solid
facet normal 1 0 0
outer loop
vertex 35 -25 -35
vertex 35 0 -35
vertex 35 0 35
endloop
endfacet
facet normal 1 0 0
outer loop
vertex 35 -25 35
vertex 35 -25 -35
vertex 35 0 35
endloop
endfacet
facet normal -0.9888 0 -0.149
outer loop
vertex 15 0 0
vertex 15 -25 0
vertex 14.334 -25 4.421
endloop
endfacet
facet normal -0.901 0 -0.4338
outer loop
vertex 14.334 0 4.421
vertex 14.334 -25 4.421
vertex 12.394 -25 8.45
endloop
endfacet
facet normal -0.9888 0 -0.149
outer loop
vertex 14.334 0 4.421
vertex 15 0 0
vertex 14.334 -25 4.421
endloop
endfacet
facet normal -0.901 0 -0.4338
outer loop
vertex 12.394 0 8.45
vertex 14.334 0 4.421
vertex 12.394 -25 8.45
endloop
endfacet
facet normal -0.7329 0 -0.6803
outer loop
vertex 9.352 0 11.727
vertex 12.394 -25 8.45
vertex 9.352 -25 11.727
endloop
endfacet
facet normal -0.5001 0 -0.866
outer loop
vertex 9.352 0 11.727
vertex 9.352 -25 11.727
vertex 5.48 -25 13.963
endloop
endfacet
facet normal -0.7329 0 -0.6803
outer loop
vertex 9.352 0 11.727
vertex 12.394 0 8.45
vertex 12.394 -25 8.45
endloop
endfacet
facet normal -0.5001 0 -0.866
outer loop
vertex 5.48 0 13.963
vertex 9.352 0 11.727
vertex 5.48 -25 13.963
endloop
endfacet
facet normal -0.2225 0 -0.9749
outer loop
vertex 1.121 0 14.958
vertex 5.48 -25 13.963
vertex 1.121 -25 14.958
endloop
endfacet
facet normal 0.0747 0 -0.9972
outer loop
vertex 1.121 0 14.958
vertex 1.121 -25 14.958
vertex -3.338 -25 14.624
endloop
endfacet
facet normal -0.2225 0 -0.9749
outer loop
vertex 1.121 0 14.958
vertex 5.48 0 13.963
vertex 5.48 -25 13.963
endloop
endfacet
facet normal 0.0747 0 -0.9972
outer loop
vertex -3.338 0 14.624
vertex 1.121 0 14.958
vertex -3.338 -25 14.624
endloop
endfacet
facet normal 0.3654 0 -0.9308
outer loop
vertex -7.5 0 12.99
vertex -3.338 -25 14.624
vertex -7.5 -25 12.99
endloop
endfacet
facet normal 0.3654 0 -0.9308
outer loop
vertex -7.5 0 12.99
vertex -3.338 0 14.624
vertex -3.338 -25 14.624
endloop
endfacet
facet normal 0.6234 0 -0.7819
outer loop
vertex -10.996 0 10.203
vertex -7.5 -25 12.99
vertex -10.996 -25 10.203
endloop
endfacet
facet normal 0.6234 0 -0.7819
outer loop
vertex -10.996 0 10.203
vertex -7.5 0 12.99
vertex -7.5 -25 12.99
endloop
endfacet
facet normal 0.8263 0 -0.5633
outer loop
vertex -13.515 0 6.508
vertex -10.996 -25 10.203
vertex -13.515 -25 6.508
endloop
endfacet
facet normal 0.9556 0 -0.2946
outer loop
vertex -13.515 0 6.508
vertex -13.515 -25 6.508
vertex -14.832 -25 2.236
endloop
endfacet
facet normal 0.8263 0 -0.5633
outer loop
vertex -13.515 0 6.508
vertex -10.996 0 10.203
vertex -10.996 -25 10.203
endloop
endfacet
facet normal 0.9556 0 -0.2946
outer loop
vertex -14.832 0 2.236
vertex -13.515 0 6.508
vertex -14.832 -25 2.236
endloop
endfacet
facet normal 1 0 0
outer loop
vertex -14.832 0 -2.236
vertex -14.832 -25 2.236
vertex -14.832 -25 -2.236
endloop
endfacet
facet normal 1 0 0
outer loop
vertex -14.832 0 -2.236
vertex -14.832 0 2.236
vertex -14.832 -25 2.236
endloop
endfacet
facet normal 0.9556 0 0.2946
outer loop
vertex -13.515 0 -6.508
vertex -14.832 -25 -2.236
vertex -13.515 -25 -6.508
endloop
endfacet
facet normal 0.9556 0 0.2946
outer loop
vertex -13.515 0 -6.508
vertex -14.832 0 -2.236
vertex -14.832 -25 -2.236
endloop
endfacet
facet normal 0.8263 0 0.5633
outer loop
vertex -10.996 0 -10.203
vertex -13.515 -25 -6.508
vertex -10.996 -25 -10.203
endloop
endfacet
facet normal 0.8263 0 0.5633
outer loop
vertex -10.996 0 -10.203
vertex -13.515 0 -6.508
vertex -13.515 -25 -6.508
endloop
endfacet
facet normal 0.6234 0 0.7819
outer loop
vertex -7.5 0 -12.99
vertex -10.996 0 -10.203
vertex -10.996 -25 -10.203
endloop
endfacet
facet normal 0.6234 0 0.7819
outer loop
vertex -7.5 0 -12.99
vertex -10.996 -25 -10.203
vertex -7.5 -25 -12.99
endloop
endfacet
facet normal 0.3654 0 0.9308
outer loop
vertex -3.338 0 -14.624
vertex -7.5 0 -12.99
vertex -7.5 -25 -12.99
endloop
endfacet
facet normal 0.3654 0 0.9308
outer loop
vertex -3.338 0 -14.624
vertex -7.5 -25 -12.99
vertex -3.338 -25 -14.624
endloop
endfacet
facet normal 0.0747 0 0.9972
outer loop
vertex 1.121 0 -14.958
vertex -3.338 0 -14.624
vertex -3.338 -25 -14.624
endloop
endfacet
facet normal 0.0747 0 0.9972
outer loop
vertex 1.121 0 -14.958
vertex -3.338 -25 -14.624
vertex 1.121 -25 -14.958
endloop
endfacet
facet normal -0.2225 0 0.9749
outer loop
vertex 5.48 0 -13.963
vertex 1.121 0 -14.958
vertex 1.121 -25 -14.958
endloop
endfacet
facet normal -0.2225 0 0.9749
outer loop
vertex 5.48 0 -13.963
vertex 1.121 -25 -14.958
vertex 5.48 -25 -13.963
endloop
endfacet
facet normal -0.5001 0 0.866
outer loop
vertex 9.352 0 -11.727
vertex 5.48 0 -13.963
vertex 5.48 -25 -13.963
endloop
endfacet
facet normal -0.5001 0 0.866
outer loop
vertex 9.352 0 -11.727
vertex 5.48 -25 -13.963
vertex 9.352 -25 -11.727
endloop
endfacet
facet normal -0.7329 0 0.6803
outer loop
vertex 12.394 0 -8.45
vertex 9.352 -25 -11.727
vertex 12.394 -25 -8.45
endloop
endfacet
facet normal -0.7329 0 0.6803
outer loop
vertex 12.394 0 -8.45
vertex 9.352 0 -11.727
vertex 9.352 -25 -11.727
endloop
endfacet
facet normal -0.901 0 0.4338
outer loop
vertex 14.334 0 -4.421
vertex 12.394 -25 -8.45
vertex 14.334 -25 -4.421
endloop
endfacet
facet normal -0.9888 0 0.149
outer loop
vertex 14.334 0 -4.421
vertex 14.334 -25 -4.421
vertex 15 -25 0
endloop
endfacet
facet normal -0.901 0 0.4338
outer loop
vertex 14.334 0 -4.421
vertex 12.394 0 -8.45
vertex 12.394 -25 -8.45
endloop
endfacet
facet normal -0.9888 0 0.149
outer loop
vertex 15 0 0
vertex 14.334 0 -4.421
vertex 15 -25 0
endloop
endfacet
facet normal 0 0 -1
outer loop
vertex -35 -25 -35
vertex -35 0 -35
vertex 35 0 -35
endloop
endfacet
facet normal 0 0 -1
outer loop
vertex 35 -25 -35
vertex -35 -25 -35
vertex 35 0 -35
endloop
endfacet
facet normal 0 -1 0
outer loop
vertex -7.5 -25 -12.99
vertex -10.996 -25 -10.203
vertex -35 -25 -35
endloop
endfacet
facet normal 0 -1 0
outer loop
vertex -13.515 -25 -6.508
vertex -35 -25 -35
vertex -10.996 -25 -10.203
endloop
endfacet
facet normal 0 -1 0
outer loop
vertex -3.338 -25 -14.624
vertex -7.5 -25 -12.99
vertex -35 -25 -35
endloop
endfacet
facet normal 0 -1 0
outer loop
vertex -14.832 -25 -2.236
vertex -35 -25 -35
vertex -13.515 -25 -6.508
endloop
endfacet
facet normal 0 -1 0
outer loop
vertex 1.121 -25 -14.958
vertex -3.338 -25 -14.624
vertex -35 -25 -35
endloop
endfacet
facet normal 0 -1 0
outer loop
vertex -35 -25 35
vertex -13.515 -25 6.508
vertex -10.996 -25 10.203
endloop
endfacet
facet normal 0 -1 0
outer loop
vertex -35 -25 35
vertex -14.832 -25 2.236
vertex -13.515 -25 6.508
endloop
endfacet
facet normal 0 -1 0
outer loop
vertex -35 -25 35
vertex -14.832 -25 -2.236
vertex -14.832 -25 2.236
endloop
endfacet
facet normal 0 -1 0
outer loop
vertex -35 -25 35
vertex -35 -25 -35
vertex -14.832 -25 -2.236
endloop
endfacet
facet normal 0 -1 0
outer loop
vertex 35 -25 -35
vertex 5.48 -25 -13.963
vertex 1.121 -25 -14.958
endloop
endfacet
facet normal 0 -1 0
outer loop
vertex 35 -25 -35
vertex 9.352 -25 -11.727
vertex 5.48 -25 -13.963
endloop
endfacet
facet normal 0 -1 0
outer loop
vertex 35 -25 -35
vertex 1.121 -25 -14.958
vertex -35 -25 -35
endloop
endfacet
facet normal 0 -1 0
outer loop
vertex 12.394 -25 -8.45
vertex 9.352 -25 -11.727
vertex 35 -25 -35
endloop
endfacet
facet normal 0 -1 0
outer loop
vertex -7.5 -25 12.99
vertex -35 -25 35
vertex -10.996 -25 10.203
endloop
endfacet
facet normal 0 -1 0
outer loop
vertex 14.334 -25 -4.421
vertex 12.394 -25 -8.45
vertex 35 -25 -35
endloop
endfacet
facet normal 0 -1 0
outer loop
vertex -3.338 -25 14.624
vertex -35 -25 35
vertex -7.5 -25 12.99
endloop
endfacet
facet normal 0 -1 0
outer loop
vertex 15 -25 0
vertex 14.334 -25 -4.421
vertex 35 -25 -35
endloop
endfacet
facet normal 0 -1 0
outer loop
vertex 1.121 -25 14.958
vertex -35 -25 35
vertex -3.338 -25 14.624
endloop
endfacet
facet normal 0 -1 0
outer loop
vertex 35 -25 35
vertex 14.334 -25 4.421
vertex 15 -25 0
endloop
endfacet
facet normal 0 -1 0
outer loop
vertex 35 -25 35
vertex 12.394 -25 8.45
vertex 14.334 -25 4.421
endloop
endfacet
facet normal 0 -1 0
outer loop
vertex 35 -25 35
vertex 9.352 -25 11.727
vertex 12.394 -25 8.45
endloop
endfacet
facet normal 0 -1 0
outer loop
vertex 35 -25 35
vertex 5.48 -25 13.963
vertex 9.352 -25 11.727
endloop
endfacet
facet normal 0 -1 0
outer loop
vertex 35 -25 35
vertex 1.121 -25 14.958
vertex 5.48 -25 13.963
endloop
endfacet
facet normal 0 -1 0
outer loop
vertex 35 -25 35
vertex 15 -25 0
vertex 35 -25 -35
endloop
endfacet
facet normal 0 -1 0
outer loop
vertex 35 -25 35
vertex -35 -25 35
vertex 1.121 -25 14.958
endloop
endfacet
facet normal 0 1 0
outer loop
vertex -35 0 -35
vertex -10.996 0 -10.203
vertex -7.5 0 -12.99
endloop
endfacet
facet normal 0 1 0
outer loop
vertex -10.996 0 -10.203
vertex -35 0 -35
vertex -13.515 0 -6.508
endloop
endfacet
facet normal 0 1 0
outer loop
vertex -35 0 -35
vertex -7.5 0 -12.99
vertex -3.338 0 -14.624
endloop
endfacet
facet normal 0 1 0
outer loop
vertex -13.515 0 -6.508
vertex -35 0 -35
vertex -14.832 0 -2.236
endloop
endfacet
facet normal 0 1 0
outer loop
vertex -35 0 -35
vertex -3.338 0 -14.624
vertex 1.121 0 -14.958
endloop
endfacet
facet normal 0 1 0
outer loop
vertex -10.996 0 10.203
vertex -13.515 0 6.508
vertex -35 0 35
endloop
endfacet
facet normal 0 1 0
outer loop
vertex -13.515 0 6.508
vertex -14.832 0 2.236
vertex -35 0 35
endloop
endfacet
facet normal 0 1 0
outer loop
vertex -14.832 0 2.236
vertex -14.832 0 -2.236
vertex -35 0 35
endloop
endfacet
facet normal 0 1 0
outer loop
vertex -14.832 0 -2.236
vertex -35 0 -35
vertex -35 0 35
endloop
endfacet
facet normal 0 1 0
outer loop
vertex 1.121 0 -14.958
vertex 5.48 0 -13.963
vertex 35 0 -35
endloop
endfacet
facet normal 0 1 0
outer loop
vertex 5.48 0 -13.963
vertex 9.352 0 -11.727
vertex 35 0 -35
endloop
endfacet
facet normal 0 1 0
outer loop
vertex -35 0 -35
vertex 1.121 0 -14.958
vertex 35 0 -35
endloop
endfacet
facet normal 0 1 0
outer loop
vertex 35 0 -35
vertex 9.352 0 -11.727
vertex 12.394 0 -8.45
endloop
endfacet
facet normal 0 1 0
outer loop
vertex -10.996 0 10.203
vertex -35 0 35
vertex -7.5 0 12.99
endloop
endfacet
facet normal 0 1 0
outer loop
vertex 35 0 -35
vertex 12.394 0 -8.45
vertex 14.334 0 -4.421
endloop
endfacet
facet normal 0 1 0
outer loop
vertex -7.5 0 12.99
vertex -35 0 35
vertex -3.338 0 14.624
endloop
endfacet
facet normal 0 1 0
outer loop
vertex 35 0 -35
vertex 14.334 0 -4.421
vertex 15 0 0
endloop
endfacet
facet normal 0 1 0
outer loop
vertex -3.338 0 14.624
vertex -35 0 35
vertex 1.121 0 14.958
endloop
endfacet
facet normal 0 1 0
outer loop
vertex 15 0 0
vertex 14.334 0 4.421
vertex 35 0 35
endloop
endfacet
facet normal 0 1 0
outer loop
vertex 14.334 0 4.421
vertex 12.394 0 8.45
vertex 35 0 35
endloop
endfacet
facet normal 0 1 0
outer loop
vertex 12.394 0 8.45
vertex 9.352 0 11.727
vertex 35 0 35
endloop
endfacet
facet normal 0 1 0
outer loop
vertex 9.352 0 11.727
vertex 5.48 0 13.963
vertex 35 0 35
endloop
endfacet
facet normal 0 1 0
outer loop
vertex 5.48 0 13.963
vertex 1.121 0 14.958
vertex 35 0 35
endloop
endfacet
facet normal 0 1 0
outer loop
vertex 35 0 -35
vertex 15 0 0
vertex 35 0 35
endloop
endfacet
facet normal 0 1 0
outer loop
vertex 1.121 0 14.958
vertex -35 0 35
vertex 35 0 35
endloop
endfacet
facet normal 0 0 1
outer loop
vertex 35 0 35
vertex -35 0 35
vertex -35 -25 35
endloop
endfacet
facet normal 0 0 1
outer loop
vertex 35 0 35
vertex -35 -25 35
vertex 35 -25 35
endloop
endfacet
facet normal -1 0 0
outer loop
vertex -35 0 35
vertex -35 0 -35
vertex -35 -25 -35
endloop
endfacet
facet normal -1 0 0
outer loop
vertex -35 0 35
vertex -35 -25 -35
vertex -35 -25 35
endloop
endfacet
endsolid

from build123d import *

# Parameters (mm, degrees)
F0_W     = 70
F0_H     = 70
F1_DEPTH = 25
F2_R     = 15
F3_DEPTH = 25


with BuildPart() as f1:
    # F0 (on Front) → F1 (new body)
    with BuildSketch(Plane.XZ):
        Rectangle(F0_W, F0_H)
    extrude(amount=F1_DEPTH)

    # F2 (on Front) → F3 (cut)
    with BuildSketch(Plane.XZ):
        Circle(F2_R)
    extrude(amount=F3_DEPTH, mode=Mode.SUBTRACT)


solid = f1.part
